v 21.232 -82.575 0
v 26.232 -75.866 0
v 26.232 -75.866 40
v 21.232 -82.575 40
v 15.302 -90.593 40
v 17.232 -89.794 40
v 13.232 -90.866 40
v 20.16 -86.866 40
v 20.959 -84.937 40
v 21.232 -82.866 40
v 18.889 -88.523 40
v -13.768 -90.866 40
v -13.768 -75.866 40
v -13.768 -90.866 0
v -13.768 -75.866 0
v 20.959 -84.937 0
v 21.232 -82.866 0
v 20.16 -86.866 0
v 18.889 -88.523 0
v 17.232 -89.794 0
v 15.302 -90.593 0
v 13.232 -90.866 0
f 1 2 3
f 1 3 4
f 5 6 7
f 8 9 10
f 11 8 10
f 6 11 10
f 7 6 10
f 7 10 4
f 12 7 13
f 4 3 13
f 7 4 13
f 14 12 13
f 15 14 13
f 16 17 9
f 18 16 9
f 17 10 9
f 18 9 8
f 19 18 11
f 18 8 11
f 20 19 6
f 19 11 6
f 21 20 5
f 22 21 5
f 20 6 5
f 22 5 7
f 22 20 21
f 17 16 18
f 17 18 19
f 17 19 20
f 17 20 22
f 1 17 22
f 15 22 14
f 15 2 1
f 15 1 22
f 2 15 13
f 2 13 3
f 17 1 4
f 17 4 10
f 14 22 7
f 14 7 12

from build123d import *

# Parameters (mm, degrees)
BOSS_EXTRUDE1_DEPTH = 40
FILLET1_R           = 8


with BuildPart() as part:
    # Sketch1 → Boss-Extrude1 (new body)
    with BuildSketch(Plane.XY):
        Polygon((-13.768148554, -75.866074504), (26.231851446, -75.866074504), (21.231851446, -82.575243148), (21.231851446, -90.866074504), (-13.768148554, -90.866074504), align=None)
    extrude(amount=BOSS_EXTRUDE1_DEPTH)

    # Fillet1
    fillet1_edges = [part.edges().sort_by_distance(p)[0] for p in [
        (21.231851446, -90.866074504, 20),
    ]]
    fillet(fillet1_edges, radius=FILLET1_R)


solid = part.part
